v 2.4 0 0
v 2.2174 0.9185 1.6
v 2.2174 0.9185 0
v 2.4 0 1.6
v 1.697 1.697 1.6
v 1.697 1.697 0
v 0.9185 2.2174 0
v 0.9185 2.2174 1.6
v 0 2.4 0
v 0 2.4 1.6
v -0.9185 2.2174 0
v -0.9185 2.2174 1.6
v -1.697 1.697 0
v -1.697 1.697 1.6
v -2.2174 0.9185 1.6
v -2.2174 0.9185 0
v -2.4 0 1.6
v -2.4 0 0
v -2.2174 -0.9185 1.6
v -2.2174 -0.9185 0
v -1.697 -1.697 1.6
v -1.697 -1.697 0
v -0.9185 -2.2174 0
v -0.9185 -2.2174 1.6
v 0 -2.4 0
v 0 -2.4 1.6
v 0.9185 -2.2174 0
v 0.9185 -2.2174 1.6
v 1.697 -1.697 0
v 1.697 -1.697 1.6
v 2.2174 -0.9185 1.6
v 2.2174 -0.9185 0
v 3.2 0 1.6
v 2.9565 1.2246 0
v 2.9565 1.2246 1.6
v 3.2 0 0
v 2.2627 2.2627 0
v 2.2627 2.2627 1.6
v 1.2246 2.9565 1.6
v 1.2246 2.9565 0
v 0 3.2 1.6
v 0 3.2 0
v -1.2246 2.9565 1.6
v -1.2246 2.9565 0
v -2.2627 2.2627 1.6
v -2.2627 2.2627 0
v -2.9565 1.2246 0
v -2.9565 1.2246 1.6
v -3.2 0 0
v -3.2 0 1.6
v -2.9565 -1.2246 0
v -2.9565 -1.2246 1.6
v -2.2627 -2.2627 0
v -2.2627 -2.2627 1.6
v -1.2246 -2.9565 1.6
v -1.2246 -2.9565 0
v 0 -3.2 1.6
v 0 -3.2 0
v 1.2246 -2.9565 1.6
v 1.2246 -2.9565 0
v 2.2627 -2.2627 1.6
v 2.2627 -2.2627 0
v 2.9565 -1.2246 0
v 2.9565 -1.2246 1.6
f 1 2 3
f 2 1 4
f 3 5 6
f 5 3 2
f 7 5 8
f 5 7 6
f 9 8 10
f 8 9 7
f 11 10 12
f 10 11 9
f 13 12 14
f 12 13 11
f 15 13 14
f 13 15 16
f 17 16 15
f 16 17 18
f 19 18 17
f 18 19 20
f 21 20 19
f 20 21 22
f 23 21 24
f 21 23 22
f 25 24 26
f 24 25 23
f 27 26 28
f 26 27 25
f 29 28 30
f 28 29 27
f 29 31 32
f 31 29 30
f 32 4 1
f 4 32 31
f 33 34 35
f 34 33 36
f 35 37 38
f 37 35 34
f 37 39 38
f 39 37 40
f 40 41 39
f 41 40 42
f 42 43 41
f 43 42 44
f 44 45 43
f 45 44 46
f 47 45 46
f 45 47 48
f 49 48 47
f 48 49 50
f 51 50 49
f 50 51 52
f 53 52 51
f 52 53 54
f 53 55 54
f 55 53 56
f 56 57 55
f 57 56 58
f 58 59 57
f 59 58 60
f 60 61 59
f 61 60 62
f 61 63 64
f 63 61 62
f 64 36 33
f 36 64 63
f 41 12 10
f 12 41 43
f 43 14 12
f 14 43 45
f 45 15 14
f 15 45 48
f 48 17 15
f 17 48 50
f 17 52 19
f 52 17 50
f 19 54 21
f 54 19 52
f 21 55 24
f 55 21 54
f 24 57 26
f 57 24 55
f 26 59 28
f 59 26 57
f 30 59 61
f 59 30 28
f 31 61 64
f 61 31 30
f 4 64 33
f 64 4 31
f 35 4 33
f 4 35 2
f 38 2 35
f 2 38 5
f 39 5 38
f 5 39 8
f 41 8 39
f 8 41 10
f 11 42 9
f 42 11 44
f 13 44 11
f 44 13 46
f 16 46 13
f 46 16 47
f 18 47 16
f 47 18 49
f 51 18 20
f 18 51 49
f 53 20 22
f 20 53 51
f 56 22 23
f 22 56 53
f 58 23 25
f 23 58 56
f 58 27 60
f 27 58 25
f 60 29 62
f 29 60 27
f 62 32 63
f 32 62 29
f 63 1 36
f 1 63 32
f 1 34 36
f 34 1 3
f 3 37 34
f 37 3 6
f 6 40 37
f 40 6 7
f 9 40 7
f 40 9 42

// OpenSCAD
// file: 4-4ring3.scad
use <../lib.scad>
function ldraw_lib__4_4ring3() = [
// 0 Ring  3 x 1.0
// 0 Name: 4-4ring3.dat
// 0 Author: James Jessiman
// 0 !LDRAW_ORG Primitive UPDATE 2009-01
// 0 !LICENSE Licensed under CC BY 4.0 : see CAreadme.txt
// 
// 0 BFC CERTIFY CCW
  [0,"BFC","CERTIFY"],
  [0,"BFC","CCW"],
// 
// 0 !HISTORY 1998-12-15 [PTadmin] Official Update 1998-10
// 0 !HISTORY 2002-04-05 [hafhead] Added BFC statement
// 0 !HISTORY 2002-04-25 [PTadmin] Official Update 2002-02
// 0 !HISTORY 2007-06-24 [PTadmin] Header formatted for Contributor Agreement
// 0 !HISTORY 2008-07-01 [PTadmin] Official Update 2008-01
// 0 !HISTORY 2008-08-26 [cwdee] Switch polygon winding and rename
// 0 !HISTORY 2009-05-02 [PTadmin] Official Update 2009-01
// 
// 
// 4 16 -1.5308 0 3.6956 -1.1481 0 2.7717 0 0 3 0 0 4
  [4,16,-1.5308,0,3.6956,-1.1481,0,2.7717,0,0,3,0,0,4],
// 4 16 -2.8284 0 2.8284 -2.1213 0 2.1213 -1.1481 0 2.7717 -1.5308 0 3.6956
  [4,16,-2.8284,0,2.8284,-2.1213,0,2.1213,-1.1481,0,2.7717,-1.5308,0,3.6956],
// 4 16 -3.6956 0 1.5308 -2.7717 0 1.1481 -2.1213 0 2.1213 -2.8284 0 2.8284
  [4,16,-3.6956,0,1.5308,-2.7717,0,1.1481,-2.1213,0,2.1213,-2.8284,0,2.8284],
// 4 16 -4 0 0 -3 0 0 -2.7717 0 1.1481 -3.6956 0 1.5308
  [4,16,-4,0,0,-3,0,0,-2.7717,0,1.1481,-3.6956,0,1.5308],
// 4 16 -3.6956 0 -1.5308 -2.7717 0 -1.1481 -3 0 0 -4 0 0
  [4,16,-3.6956,0,-1.5308,-2.7717,0,-1.1481,-3,0,0,-4,0,0],
// 4 16 -2.8284 0 -2.8284 -2.1213 0 -2.1213 -2.7717 0 -1.1481 -3.6956 0 -1.5308
  [4,16,-2.8284,0,-2.8284,-2.1213,0,-2.1213,-2.7717,0,-1.1481,-3.6956,0,-1.5308],
// 4 16 -1.5308 0 -3.6956 -1.1481 0 -2.7717 -2.1213 0 -2.1213 -2.8284 0 -2.8284
  [4,16,-1.5308,0,-3.6956,-1.1481,0,-2.7717,-2.1213,0,-2.1213,-2.8284,0,-2.8284],
// 4 16 0 0 -4 0 0 -3 -1.1481 0 -2.7717 -1.5308 0 -3.6956
  [4,16,0,0,-4,0,0,-3,-1.1481,0,-2.7717,-1.5308,0,-3.6956],
// 4 16 1.5308 0 -3.6956 1.1481 0 -2.7717 0 0 -3 0 0 -4
  [4,16,1.5308,0,-3.6956,1.1481,0,-2.7717,0,0,-3,0,0,-4],
// 4 16 2.8284 0 -2.8284 2.1213 0 -2.1213 1.1481 0 -2.7717 1.5308 0 -3.6956
  [4,16,2.8284,0,-2.8284,2.1213,0,-2.1213,1.1481,0,-2.7717,1.5308,0,-3.6956],
// 4 16 3.6956 0 -1.5308 2.7717 0 -1.1481 2.1213 0 -2.1213 2.8284 0 -2.8284
  [4,16,3.6956,0,-1.5308,2.7717,0,-1.1481,2.1213,0,-2.1213,2.8284,0,-2.8284],
// 4 16 4 0 0 3 0 0 2.7717 0 -1.1481 3.6956 0 -1.5308
  [4,16,4,0,0,3,0,0,2.7717,0,-1.1481,3.6956,0,-1.5308],
// 4 16 3.6956 0 1.5308 2.7717 0 1.1481 3 0 0 4 0 0
  [4,16,3.6956,0,1.5308,2.7717,0,1.1481,3,0,0,4,0,0],
// 4 16 2.8284 0 2.8284 2.1213 0 2.1213 2.7717 0 1.1481 3.6956 0 1.5308
  [4,16,2.8284,0,2.8284,2.1213,0,2.1213,2.7717,0,1.1481,3.6956,0,1.5308],
// 4 16 1.5308 0 3.6956 1.1481 0 2.7717 2.1213 0 2.1213 2.8284 0 2.8284
  [4,16,1.5308,0,3.6956,1.1481,0,2.7717,2.1213,0,2.1213,2.8284,0,2.8284],
// 4 16 0 0 4 0 0 3 1.1481 0 2.7717 1.5308 0 3.6956
  [4,16,0,0,4,0,0,3,1.1481,0,2.7717,1.5308,0,3.6956],
// 0
];
module ldraw_lib__4_4ring3(step=0, col=false, unit=2/5, alt=false, line=0.2, solid=!$preview)
    makepoly(ldraw_lib__4_4ring3(), step=step, col=col, unit=unit, alt=alt, line=line, solid=solid);
ldraw_lib__4_4ring3(line=0.2);
// file: 4-4edge.scad
use <../lib.scad>
function ldraw_lib__4_4edge() = [
// 0 Circle 1.0
// 0 Name: 4-4edge.dat
// 0 Author: James Jessiman
// 0 !LDRAW_ORG Primitive UPDATE 2017-01
// 0 !LICENSE Licensed under CC BY 4.0 : see CAreadme.txt
// 
// 0 BFC CERTIFY CCW
  [0,"BFC","CERTIFY"],
  [0,"BFC","CCW"],
// 
// 0 !HISTORY 1998-12-15 [PTadmin] Official Update 1998-10
// 0 !HISTORY 2005-12-28 [PTadmin] Official Update 2005-01
// 0 !HISTORY 2007-06-24 [PTadmin] Header formatted for Contributor Agreement
// 0 !HISTORY 2008-07-01 [PTadmin] Official Update 2008-01
// 0 !HISTORY 2017-01-15 [Steffen] BFCed
// 0 !HISTORY 2017-12-30 [PTadmin] Official Update 2017-01
// 
// 
// 2 24 1 0 0 0.9239 0 0.3827
  [2,24,1,0,0,0.9239,0,0.3827],
// 2 24 0.9239 0 0.3827 0.7071 0 0.7071
  [2,24,0.9239,0,0.3827,0.7071,0,0.7071],
// 2 24 0.7071 0 0.7071 0.3827 0 0.9239
  [2,24,0.7071,0,0.7071,0.3827,0,0.9239],
// 2 24 0.3827 0 0.9239 0 0 1
  [2,24,0.3827,0,0.9239,0,0,1],
// 2 24 0 0 1 -0.3827 0 0.9239
  [2,24,0,0,1,-0.3827,0,0.9239],
// 2 24 -0.3827 0 0.9239 -0.7071 0 0.7071
  [2,24,-0.3827,0,0.9239,-0.7071,0,0.7071],
// 2 24 -0.7071 0 0.7071 -0.9239 0 0.3827
  [2,24,-0.7071,0,0.7071,-0.9239,0,0.3827],
// 2 24 -0.9239 0 0.3827 -1 0 -0
  [2,24,-0.9239,0,0.3827,-1,0,-0],
// 2 24 -1 0 -0 -0.9239 0 -0.3827
  [2,24,-1,0,-0,-0.9239,0,-0.3827],
// 2 24 -0.9239 0 -0.3827 -0.7071 0 -0.7071
  [2,24,-0.9239,0,-0.3827,-0.7071,0,-0.7071],
// 2 24 -0.7071 0 -0.7071 -0.3827 0 -0.9239
  [2,24,-0.7071,0,-0.7071,-0.3827,0,-0.9239],
// 2 24 -0.3827 0 -0.9239 0 0 -1
  [2,24,-0.3827,0,-0.9239,0,0,-1],
// 2 24 0 0 -1 0.3827 0 -0.9239
  [2,24,0,0,-1,0.3827,0,-0.9239],
// 2 24 0.3827 0 -0.9239 0.7071 0 -0.7071
  [2,24,0.3827,0,-0.9239,0.7071,0,-0.7071],
// 2 24 0.7071 0 -0.7071 0.9239 0 -0.3827
  [2,24,0.7071,0,-0.7071,0.9239,0,-0.3827],
// 2 24 0.9239 0 -0.3827 1 0 0
  [2,24,0.9239,0,-0.3827,1,0,0],
];
module ldraw_lib__4_4edge(step=0, col=false, unit=2/5, alt=false, line=0.2, solid=!$preview)
    makepoly(ldraw_lib__4_4edge(), step=step, col=col, unit=unit, alt=alt, line=line, solid=solid);
ldraw_lib__4_4edge(line=0.2);
// file: 4-4cyli.scad
use <../lib.scad>
function ldraw_lib__4_4cyli() = [
// 0 Cylinder 1.0
// 0 Name: 4-4cyli.dat
// 0 Author: James Jessiman
// 0 !LDRAW_ORG Primitive UPDATE 2005-01
// 0 !LICENSE Licensed under CC BY 4.0 : see CAreadme.txt
// 
// 0 BFC CERTIFY CCW
  [0,"BFC","CERTIFY"],
  [0,"BFC","CCW"],
// 
// 0 !HISTORY 1998-12-15 [PTadmin] Official Update 1998-10
// 0 !HISTORY 2002-03-23 [sbliss] Added BFC statement; merged headers from files in distributions LDraw 0.27 and Complete.
// 0 !HISTORY 2002-04-25 [PTadmin] Official Update 2002-02
// 0 !HISTORY 2004-12-14 [guyvivan] BFC CCW
// 0 !HISTORY 2005-12-28 [PTadmin] Official Update 2005-01
// 0 !HISTORY 2007-06-24 [PTadmin] Header formatted for Contributor Agreement
// 0 !HISTORY 2008-07-01 [PTadmin] Official Update 2008-01
// 
// 
// 4 16 1 1 0 0.9239 1 0.3827 0.9239 0 0.3827 1 0 0
  [4,16,1,1,0,0.9239,1,0.3827,0.9239,0,0.3827,1,0,0],
// 5 24 1 0 0 1 1 0 0.9239 0 0.3827 0.9239 0 -0.3827
  [5,24,1,0,0,1,1,0,0.9239,0,0.3827,0.9239,0,-0.3827],
// 4 16 0.9239 1 0.3827 0.7071 1 0.7071 0.7071 0 0.7071 0.9239 0 0.3827
  [4,16,0.9239,1,0.3827,0.7071,1,0.7071,0.7071,0,0.7071,0.9239,0,0.3827],
// 5 24 0.9239 0 0.3827 0.9239 1 0.3827 0.7071 0 0.7071 1 0 0
  [5,24,0.9239,0,0.3827,0.9239,1,0.3827,0.7071,0,0.7071,1,0,0],
// 4 16 0.7071 1 0.7071 0.3827 1 0.9239 0.3827 0 0.9239 0.7071 0 0.7071
  [4,16,0.7071,1,0.7071,0.3827,1,0.9239,0.3827,0,0.9239,0.7071,0,0.7071],
// 5 24 0.7071 0 0.7071 0.7071 1 0.7071 0.3827 0 0.9239 0.9239 0 0.3827
  [5,24,0.7071,0,0.7071,0.7071,1,0.7071,0.3827,0,0.9239,0.9239,0,0.3827],
// 4 16 0.3827 1 0.9239 0 1 1 0 0 1 0.3827 0 0.9239
  [4,16,0.3827,1,0.9239,0,1,1,0,0,1,0.3827,0,0.9239],
// 5 24 0.3827 0 0.9239 0.3827 1 0.9239 0 0 1 0.7071 0 0.7071
  [5,24,0.3827,0,0.9239,0.3827,1,0.9239,0,0,1,0.7071,0,0.7071],
// 4 16 0 1 1 -0.3827 1 0.9239 -0.3827 0 0.9239 0 0 1
  [4,16,0,1,1,-0.3827,1,0.9239,-0.3827,0,0.9239,0,0,1],
// 5 24 0 0 1 0 1 1 -0.3827 0 0.9239 0.3827 0 0.9239
  [5,24,0,0,1,0,1,1,-0.3827,0,0.9239,0.3827,0,0.9239],
// 4 16 -0.3827 1 0.9239 -0.7071 1 0.7071 -0.7071 0 0.7071 -0.3827 0 0.9239
  [4,16,-0.3827,1,0.9239,-0.7071,1,0.7071,-0.7071,0,0.7071,-0.3827,0,0.9239],
// 5 24 -0.3827 0 0.9239 -0.3827 1 0.9239 -0.7071 0 0.7071 0 0 1
  [5,24,-0.3827,0,0.9239,-0.3827,1,0.9239,-0.7071,0,0.7071,0,0,1],
// 4 16 -0.7071 1 0.7071 -0.9239 1 0.3827 -0.9239 0 0.3827 -0.7071 0 0.7071
  [4,16,-0.7071,1,0.7071,-0.9239,1,0.3827,-0.9239,0,0.3827,-0.7071,0,0.7071],
// 5 24 -0.7071 0 0.7071 -0.7071 1 0.7071 -0.9239 0 0.3827 -0.3827 0 0.9239
  [5,24,-0.7071,0,0.7071,-0.7071,1,0.7071,-0.9239,0,0.3827,-0.3827,0,0.9239],
// 4 16 -0.9239 1 0.3827 -1 1 0 -1 0 0 -0.9239 0 0.3827
  [4,16,-0.9239,1,0.3827,-1,1,0,-1,0,0,-0.9239,0,0.3827],
// 5 24 -0.9239 0 0.3827 -0.9239 1 0.3827 -1 0 0 -0.7071 0 0.7071
  [5,24,-0.9239,0,0.3827,-0.9239,1,0.3827,-1,0,0,-0.7071,0,0.7071],
// 4 16 -1 1 0 -0.9239 1 -0.3827 -0.9239 0 -0.3827 -1 0 0
  [4,16,-1,1,0,-0.9239,1,-0.3827,-0.9239,0,-0.3827,-1,0,0],
// 5 24 -1 0 0 -1 1 0 -0.9239 0 -0.3827 -0.9239 0 0.3827
  [5,24,-1,0,0,-1,1,0,-0.9239,0,-0.3827,-0.9239,0,0.3827],
// 4 16 -0.9239 1 -0.3827 -0.7071 1 -0.7071 -0.7071 0 -0.7071 -0.9239 0 -0.3827
  [4,16,-0.9239,1,-0.3827,-0.7071,1,-0.7071,-0.7071,0,-0.7071,-0.9239,0,-0.3827],
// 5 24 -0.9239 0 -0.3827 -0.9239 1 -0.3827 -0.7071 0 -0.7071 -1 0 0
  [5,24,-0.9239,0,-0.3827,-0.9239,1,-0.3827,-0.7071,0,-0.7071,-1,0,0],
// 4 16 -0.7071 1 -0.7071 -0.3827 1 -0.9239 -0.3827 0 -0.9239 -0.7071 0 -0.7071
  [4,16,-0.7071,1,-0.7071,-0.3827,1,-0.9239,-0.3827,0,-0.9239,-0.7071,0,-0.7071],
// 5 24 -0.7071 0 -0.7071 -0.7071 1 -0.7071 -0.3827 0 -0.9239 -0.9239 0 -0.3827
  [5,24,-0.7071,0,-0.7071,-0.7071,1,-0.7071,-0.3827,0,-0.9239,-0.9239,0,-0.3827],
// 4 16 -0.3827 1 -0.9239 0 1 -1 0 0 -1 -0.3827 0 -0.9239
  [4,16,-0.3827,1,-0.9239,0,1,-1,0,0,-1,-0.3827,0,-0.9239],
// 5 24 -0.3827 0 -0.9239 -0.3827 1 -0.9239 0 0 -1 -0.7071 0 -0.7071
  [5,24,-0.3827,0,-0.9239,-0.3827,1,-0.9239,0,0,-1,-0.7071,0,-0.7071],
// 4 16 0 1 -1 0.3827 1 -0.9239 0.3827 0 -0.9239 0 0 -1
  [4,16,0,1,-1,0.3827,1,-0.9239,0.3827,0,-0.9239,0,0,-1],
// 5 24 0 0 -1 0 1 -1 0.3827 0 -0.9239 -0.3827 0 -0.9239
  [5,24,0,0,-1,0,1,-1,0.3827,0,-0.9239,-0.3827,0,-0.9239],
// 4 16 0.3827 1 -0.9239 0.7071 1 -0.7071 0.7071 0 -0.7071 0.3827 0 -0.9239
  [4,16,0.3827,1,-0.9239,0.7071,1,-0.7071,0.7071,0,-0.7071,0.3827,0,-0.9239],
// 5 24 0.3827 0 -0.9239 0.3827 1 -0.9239 0.7071 0 -0.7071 0 0 -1
  [5,24,0.3827,0,-0.9239,0.3827,1,-0.9239,0.7071,0,-0.7071,0,0,-1],
// 4 16 0.7071 1 -0.7071 0.9239 1 -0.3827 0.9239 0 -0.3827 0.7071 0 -0.7071
  [4,16,0.7071,1,-0.7071,0.9239,1,-0.3827,0.9239,0,-0.3827,0.7071,0,-0.7071],
// 5 24 0.7071 0 -0.7071 0.7071 1 -0.7071 0.9239 0 -0.3827 0.3827 0 -0.9239
  [5,24,0.7071,0,-0.7071,0.7071,1,-0.7071,0.9239,0,-0.3827,0.3827,0,-0.9239],
// 4 16 0.9239 1 -0.3827 1 1 0 1 0 0 0.9239 0 -0.3827
  [4,16,0.9239,1,-0.3827,1,1,0,1,0,0,0.9239,0,-0.3827],
// 5 24 0.9239 0 -0.3827 0.9239 1 -0.3827 1 0 0 0.7071 0 -0.7071
  [5,24,0.9239,0,-0.3827,0.9239,1,-0.3827,1,0,0,0.7071,0,-0.7071],
// 0
];
module ldraw_lib__4_4cyli(step=0, col=false, unit=2/5, alt=false, line=0.2, solid=!$preview)
    makepoly(ldraw_lib__4_4cyli(), step=step, col=col, unit=unit, alt=alt, line=line, solid=solid);
ldraw_lib__4_4cyli(line=0.2);
// main file
use <../lib.scad>
use <4-4cyli.scad>
use <4-4edge.scad>
use <4-4ring3.scad>
function ldraw_lib__stud4() = [
// 0 Stud Tube Open
// 0 Name: stud4.dat
// 0 Author: James Jessiman
// 0 !LDRAW_ORG Primitive UPDATE 2009-02
// 0 !LICENSE Licensed under CC BY 4.0 : see CAreadme.txt
// 
// 0 BFC CERTIFY CCW
  [0,"BFC","CERTIFY"],
  [0,"BFC","CCW"],
// 
// 0 !HISTORY 1999-07-05 [PTadmin] Official Update 1999-05
// 0 !HISTORY 2002-04-04 [sbliss] Modified for BFC compliance
// 0 !HISTORY 2002-04-25 [PTadmin] Official Update 2002-02
// 0 !HISTORY 2007-06-24 [PTadmin] Header formatted for Contributor Agreement
// 0 !HISTORY 2008-07-01 [PTadmin] Official Update 2008-01
// 0 !HISTORY 2009-06-21 [cwdee] Update ring references to 4-4ring
// 0 !HISTORY 2009-09-03 [PTadmin] Official Update 2009-02
// 
// 
// 1 16 0 -4 0 6 0 0 0 1 0 0 0 6 4-4edge.dat
  [1,16,0,-4,0,6,0,0,0,1,0,0,0,6, ldraw_lib__4_4edge()],
// 1 16 0 -4 0 8 0 0 0 1 0 0 0 8 4-4edge.dat
  [1,16,0,-4,0,8,0,0,0,1,0,0,0,8, ldraw_lib__4_4edge()],
// 1 16 0 0 0 6 0 0 0 1 0 0 0 6 4-4edge.dat
  [1,16,0,0,0,6,0,0,0,1,0,0,0,6, ldraw_lib__4_4edge()],
// 1 16 0 0 0 8 0 0 0 1 0 0 0 8 4-4edge.dat
  [1,16,0,0,0,8,0,0,0,1,0,0,0,8, ldraw_lib__4_4edge()],
// 0 BFC INVERTNEXT
  [0,"BFC","INVERTNEXT"],
// 1 16 0 -4 0 6 0 0 0 4 0 0 0 6 4-4cyli.dat
  [1,16,0,-4,0,6,0,0,0,4,0,0,0,6, ldraw_lib__4_4cyli()],
// 1 16 0 -4 0 8 0 0 0 4 0 0 0 8 4-4cyli.dat
  [1,16,0,-4,0,8,0,0,0,4,0,0,0,8, ldraw_lib__4_4cyli()],
// 1 16 0 -4 0 2 0 0 0 1 0 0 0 2 4-4ring3.dat
  [1,16,0,-4,0,2,0,0,0,1,0,0,0,2, ldraw_lib__4_4ring3()],
  [-1,16,0,0,0,2,0,0,0,-1,0,0,0,2, ldraw_lib__4_4ring3()],
// 0
];
module ldraw_lib__stud4(step=0, col=false, unit=2/5, alt=false, line=0.2, solid=!$preview)
    makepoly(ldraw_lib__stud4(), step=step, col=col, unit=unit, alt=alt, line=line, solid=solid);
ldraw_lib__stud4(line=0.2);
